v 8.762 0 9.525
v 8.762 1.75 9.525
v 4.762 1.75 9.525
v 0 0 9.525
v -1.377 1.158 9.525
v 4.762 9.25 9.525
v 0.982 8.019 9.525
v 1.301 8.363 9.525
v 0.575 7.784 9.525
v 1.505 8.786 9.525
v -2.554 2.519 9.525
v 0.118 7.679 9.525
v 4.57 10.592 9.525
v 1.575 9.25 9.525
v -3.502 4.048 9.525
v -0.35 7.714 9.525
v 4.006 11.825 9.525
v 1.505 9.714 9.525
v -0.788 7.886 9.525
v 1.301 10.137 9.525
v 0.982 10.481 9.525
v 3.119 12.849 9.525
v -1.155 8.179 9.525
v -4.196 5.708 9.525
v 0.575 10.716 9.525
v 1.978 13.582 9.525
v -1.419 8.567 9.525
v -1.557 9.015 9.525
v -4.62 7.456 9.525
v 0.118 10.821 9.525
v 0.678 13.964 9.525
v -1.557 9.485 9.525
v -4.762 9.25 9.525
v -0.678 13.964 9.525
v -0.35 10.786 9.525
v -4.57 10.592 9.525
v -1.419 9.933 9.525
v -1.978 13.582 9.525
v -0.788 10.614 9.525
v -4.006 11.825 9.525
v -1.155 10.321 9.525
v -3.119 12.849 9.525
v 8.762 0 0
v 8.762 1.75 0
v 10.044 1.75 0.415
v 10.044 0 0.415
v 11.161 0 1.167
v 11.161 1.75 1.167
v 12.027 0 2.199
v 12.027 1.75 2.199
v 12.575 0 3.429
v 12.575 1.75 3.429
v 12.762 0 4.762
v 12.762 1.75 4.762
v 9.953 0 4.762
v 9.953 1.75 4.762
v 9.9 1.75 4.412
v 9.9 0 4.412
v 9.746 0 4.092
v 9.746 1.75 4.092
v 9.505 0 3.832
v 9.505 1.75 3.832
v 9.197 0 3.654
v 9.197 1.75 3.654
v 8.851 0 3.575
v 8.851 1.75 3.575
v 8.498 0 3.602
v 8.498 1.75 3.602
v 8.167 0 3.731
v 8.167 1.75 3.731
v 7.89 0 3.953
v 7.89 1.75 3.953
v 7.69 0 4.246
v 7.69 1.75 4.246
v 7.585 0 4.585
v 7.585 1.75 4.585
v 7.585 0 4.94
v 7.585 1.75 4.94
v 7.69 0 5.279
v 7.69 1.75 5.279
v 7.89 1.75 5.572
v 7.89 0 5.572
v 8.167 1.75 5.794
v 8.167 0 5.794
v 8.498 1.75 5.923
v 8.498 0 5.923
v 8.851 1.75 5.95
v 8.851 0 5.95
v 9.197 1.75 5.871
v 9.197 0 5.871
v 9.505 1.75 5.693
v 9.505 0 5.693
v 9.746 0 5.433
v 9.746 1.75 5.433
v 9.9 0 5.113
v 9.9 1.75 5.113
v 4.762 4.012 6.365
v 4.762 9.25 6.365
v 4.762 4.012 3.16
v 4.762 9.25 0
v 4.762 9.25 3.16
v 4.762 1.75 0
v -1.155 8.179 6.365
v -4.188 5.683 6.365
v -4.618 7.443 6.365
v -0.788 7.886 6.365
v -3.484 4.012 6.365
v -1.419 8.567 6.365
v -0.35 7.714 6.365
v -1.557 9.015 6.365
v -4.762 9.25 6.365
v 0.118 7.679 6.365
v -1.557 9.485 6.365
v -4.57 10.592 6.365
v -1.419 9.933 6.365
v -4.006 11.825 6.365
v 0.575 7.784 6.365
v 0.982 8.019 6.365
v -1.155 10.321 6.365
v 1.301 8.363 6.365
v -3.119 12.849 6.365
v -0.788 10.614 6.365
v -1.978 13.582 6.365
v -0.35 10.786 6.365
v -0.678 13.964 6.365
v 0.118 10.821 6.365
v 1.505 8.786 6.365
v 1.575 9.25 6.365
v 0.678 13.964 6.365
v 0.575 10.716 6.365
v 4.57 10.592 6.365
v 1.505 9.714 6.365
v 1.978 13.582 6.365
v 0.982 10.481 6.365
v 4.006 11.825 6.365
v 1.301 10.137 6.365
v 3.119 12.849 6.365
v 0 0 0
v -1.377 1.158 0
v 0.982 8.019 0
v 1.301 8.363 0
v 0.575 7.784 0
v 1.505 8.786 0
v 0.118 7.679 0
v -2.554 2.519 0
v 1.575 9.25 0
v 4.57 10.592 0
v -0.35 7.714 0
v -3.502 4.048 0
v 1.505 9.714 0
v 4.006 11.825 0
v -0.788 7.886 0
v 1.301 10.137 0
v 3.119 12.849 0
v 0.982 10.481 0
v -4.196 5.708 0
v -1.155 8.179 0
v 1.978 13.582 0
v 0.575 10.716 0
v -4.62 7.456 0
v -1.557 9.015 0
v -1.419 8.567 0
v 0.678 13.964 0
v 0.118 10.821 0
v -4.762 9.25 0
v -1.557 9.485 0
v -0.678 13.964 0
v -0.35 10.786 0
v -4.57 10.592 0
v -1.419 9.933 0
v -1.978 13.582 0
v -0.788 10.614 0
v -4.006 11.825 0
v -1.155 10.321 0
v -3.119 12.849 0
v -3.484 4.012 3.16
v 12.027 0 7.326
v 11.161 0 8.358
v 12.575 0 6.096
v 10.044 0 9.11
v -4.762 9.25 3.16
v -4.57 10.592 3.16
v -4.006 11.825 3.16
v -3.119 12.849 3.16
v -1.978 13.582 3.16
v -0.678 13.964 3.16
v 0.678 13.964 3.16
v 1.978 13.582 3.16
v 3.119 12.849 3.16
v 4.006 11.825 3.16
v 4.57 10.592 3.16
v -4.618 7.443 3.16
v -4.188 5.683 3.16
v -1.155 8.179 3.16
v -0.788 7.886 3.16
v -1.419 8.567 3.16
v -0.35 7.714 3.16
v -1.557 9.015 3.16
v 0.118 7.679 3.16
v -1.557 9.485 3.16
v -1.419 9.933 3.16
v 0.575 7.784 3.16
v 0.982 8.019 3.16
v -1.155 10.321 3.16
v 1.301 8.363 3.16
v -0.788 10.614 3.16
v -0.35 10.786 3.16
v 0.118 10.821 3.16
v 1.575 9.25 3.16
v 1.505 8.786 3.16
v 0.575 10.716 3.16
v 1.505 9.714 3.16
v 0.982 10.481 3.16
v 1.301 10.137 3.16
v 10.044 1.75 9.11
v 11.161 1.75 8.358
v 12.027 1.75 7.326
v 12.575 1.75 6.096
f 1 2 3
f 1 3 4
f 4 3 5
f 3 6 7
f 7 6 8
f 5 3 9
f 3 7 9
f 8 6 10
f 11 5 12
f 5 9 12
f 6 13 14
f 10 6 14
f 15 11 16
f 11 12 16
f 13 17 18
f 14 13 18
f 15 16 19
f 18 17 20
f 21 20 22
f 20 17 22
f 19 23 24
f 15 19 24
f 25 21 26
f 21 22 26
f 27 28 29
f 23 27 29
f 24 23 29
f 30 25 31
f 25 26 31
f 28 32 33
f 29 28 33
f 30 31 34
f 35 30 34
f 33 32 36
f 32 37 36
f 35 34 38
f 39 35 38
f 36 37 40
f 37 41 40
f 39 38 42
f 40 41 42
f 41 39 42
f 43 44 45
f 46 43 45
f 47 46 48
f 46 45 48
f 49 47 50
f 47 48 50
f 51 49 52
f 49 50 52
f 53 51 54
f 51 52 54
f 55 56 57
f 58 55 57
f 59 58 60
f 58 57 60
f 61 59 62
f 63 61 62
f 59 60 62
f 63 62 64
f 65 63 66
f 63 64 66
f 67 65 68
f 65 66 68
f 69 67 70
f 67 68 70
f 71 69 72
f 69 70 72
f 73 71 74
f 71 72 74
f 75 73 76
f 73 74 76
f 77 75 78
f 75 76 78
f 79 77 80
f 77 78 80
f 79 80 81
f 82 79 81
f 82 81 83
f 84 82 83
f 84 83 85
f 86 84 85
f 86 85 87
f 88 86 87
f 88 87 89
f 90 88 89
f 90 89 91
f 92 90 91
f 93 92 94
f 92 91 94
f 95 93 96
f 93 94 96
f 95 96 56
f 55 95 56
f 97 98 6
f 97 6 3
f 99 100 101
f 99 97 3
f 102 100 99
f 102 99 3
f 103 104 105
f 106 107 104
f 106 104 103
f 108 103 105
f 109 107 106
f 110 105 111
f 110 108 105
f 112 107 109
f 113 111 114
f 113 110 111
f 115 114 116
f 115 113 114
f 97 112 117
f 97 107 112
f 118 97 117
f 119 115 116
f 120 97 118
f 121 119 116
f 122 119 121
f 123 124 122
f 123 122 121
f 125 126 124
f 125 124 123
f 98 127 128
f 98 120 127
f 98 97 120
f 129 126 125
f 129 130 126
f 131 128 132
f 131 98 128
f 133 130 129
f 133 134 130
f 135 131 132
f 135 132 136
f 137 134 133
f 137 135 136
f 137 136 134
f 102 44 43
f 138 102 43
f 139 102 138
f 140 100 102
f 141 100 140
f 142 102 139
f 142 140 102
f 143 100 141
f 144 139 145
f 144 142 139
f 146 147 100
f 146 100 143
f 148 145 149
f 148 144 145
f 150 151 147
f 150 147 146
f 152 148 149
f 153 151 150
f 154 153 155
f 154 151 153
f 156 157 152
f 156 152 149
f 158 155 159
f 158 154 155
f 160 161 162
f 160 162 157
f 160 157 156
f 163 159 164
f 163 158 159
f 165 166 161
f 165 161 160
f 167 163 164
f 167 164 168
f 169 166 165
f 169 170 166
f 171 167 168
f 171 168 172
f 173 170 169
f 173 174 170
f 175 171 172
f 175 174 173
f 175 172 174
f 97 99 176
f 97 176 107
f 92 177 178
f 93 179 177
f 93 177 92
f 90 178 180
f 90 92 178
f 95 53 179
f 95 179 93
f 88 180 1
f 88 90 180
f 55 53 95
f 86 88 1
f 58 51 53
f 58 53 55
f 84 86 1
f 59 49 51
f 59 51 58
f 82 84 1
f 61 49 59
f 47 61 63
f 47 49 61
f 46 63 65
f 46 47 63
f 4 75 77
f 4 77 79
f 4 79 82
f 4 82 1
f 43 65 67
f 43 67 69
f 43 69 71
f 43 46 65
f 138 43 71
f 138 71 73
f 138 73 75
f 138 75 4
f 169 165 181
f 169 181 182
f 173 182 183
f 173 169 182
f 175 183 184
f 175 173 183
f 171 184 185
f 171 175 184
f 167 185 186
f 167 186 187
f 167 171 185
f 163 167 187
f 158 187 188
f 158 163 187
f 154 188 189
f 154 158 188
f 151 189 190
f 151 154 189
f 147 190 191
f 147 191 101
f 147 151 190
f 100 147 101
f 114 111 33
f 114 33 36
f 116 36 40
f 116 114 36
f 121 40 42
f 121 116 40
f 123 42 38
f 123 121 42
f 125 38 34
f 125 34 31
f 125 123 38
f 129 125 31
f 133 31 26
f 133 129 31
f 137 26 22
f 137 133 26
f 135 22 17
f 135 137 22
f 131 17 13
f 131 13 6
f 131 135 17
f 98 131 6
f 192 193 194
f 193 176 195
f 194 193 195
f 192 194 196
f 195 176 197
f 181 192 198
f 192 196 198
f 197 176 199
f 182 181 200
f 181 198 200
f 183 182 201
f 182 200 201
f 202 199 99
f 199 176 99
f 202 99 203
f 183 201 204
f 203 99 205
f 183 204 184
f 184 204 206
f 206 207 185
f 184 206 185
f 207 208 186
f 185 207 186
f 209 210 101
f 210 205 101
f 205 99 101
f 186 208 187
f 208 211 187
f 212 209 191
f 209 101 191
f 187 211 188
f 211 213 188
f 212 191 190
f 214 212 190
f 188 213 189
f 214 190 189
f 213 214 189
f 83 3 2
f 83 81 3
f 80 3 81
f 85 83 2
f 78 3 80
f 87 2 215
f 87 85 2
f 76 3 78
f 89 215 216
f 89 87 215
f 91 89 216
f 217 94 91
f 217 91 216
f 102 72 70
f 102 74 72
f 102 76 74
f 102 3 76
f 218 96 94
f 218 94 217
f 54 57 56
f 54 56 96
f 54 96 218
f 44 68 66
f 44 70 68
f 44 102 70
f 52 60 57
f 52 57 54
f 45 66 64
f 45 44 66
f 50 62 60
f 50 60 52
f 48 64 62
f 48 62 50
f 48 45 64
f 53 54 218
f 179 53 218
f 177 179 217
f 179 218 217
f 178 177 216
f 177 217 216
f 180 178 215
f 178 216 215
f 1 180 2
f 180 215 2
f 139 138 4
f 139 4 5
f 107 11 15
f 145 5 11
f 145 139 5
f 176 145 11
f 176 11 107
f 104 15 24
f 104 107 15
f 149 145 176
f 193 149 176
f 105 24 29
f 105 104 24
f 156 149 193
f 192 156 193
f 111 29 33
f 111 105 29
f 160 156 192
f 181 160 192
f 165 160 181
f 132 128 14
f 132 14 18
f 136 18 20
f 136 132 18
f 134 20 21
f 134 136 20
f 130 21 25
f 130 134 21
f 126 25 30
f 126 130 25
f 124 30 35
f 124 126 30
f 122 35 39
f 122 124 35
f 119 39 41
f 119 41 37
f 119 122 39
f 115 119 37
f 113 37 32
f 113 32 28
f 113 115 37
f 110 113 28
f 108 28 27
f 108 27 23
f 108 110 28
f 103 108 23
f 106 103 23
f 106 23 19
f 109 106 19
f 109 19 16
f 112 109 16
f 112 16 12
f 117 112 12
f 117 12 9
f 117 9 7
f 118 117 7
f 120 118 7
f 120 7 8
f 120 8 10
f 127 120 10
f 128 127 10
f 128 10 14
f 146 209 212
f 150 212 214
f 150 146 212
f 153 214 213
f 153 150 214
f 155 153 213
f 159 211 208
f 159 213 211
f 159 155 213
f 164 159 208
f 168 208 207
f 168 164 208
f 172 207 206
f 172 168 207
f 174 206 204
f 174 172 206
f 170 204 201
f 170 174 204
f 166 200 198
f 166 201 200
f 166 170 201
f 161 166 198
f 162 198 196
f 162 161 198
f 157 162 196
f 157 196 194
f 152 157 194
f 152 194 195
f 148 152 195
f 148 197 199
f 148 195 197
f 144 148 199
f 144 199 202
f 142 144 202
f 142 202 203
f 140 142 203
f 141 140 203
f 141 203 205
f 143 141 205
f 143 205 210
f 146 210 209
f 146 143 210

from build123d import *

# Parameters (mm, degrees)
SKETCH1_R           = 1.575
BOSS_EXTRUDE1_DEPTH = 9.525
CUT_EXTRUDE4_REACH  = 11.525
SKETCH2_W           = 3.205
SKETCH2_H           = 10
SKETCH4_R           = 1.190625
CUT_EXTRUDE5_DEPTH  = 1.75


with BuildPart() as part:
    # Sketch1 → Boss-Extrude1 (new body)
    with BuildSketch(Plane.XY):
        with BuildLine():
            Line((4.7625, 9.25), (4.7625, 1.75))
            Line((4.7625, 1.75), (12.7625, 1.75))
            Line((12.7625, 1.75), (12.7625, 0))
            Line((12.7625, 0), (0, 0))
            ThreePointArc((0, 0), (-3.501964629, 4.047983414), (-4.7625, 9.25))
            ThreePointArc((-4.7625, 9.25), (0, 14.0125), (4.7625, 9.25))
        make_face()
        with Locations((0, 9.25)):
            Circle(SKETCH1_R, mode=Mode.SUBTRACT)
    extrude(amount=BOSS_EXTRUDE1_DEPTH)

    # Sketch2 → Cut-Extrude4 (cut, up to next)
    with BuildSketch(Plane.ZY.offset(-4.7625), mode=Mode.PRIVATE) as cut_extrude4_sk1:
        with Locations((4.7625, 9.0125)):
            Rectangle(SKETCH2_W, SKETCH2_H)
    cut_extrude4_tool1 = extrude(cut_extrude4_sk1.sketch, amount=CUT_EXTRUDE4_REACH, mode=Mode.PRIVATE) & part.part
    add(cut_extrude4_tool1.solids().sort_by_distance((4.7625, 9.0125, 4.7625))[0], mode=Mode.SUBTRACT)

    # Sketch4 → Cut-Extrude5 (cut)
    with BuildSketch(Plane(origin=(0, 1.75, 0), x_dir=(1, 0, 0), z_dir=(0, 1, 0))):
        with BuildLine():
            Line((12.7625, -9.525), (12.7625, -4.7625))
            ThreePointArc((12.7625, -4.7625), (11.62983327, -7.872218888), (8.7625, -9.525))
            Line((8.7625, -9.525), (12.7625, -9.525))
        make_face()
        with BuildLine():
            Line((12.7625, 0), (8.7625, 0))
            ThreePointArc((8.7625, 0), (11.62983327, -1.652781112), (12.7625, -4.7625))
            Line((12.7625, -4.7625), (12.7625, 0))
        make_face()
        with Locations((8.7625, -4.7625)):
            Circle(SKETCH4_R)
    extrude(amount=-CUT_EXTRUDE5_DEPTH, mode=Mode.SUBTRACT)


solid = part.part
